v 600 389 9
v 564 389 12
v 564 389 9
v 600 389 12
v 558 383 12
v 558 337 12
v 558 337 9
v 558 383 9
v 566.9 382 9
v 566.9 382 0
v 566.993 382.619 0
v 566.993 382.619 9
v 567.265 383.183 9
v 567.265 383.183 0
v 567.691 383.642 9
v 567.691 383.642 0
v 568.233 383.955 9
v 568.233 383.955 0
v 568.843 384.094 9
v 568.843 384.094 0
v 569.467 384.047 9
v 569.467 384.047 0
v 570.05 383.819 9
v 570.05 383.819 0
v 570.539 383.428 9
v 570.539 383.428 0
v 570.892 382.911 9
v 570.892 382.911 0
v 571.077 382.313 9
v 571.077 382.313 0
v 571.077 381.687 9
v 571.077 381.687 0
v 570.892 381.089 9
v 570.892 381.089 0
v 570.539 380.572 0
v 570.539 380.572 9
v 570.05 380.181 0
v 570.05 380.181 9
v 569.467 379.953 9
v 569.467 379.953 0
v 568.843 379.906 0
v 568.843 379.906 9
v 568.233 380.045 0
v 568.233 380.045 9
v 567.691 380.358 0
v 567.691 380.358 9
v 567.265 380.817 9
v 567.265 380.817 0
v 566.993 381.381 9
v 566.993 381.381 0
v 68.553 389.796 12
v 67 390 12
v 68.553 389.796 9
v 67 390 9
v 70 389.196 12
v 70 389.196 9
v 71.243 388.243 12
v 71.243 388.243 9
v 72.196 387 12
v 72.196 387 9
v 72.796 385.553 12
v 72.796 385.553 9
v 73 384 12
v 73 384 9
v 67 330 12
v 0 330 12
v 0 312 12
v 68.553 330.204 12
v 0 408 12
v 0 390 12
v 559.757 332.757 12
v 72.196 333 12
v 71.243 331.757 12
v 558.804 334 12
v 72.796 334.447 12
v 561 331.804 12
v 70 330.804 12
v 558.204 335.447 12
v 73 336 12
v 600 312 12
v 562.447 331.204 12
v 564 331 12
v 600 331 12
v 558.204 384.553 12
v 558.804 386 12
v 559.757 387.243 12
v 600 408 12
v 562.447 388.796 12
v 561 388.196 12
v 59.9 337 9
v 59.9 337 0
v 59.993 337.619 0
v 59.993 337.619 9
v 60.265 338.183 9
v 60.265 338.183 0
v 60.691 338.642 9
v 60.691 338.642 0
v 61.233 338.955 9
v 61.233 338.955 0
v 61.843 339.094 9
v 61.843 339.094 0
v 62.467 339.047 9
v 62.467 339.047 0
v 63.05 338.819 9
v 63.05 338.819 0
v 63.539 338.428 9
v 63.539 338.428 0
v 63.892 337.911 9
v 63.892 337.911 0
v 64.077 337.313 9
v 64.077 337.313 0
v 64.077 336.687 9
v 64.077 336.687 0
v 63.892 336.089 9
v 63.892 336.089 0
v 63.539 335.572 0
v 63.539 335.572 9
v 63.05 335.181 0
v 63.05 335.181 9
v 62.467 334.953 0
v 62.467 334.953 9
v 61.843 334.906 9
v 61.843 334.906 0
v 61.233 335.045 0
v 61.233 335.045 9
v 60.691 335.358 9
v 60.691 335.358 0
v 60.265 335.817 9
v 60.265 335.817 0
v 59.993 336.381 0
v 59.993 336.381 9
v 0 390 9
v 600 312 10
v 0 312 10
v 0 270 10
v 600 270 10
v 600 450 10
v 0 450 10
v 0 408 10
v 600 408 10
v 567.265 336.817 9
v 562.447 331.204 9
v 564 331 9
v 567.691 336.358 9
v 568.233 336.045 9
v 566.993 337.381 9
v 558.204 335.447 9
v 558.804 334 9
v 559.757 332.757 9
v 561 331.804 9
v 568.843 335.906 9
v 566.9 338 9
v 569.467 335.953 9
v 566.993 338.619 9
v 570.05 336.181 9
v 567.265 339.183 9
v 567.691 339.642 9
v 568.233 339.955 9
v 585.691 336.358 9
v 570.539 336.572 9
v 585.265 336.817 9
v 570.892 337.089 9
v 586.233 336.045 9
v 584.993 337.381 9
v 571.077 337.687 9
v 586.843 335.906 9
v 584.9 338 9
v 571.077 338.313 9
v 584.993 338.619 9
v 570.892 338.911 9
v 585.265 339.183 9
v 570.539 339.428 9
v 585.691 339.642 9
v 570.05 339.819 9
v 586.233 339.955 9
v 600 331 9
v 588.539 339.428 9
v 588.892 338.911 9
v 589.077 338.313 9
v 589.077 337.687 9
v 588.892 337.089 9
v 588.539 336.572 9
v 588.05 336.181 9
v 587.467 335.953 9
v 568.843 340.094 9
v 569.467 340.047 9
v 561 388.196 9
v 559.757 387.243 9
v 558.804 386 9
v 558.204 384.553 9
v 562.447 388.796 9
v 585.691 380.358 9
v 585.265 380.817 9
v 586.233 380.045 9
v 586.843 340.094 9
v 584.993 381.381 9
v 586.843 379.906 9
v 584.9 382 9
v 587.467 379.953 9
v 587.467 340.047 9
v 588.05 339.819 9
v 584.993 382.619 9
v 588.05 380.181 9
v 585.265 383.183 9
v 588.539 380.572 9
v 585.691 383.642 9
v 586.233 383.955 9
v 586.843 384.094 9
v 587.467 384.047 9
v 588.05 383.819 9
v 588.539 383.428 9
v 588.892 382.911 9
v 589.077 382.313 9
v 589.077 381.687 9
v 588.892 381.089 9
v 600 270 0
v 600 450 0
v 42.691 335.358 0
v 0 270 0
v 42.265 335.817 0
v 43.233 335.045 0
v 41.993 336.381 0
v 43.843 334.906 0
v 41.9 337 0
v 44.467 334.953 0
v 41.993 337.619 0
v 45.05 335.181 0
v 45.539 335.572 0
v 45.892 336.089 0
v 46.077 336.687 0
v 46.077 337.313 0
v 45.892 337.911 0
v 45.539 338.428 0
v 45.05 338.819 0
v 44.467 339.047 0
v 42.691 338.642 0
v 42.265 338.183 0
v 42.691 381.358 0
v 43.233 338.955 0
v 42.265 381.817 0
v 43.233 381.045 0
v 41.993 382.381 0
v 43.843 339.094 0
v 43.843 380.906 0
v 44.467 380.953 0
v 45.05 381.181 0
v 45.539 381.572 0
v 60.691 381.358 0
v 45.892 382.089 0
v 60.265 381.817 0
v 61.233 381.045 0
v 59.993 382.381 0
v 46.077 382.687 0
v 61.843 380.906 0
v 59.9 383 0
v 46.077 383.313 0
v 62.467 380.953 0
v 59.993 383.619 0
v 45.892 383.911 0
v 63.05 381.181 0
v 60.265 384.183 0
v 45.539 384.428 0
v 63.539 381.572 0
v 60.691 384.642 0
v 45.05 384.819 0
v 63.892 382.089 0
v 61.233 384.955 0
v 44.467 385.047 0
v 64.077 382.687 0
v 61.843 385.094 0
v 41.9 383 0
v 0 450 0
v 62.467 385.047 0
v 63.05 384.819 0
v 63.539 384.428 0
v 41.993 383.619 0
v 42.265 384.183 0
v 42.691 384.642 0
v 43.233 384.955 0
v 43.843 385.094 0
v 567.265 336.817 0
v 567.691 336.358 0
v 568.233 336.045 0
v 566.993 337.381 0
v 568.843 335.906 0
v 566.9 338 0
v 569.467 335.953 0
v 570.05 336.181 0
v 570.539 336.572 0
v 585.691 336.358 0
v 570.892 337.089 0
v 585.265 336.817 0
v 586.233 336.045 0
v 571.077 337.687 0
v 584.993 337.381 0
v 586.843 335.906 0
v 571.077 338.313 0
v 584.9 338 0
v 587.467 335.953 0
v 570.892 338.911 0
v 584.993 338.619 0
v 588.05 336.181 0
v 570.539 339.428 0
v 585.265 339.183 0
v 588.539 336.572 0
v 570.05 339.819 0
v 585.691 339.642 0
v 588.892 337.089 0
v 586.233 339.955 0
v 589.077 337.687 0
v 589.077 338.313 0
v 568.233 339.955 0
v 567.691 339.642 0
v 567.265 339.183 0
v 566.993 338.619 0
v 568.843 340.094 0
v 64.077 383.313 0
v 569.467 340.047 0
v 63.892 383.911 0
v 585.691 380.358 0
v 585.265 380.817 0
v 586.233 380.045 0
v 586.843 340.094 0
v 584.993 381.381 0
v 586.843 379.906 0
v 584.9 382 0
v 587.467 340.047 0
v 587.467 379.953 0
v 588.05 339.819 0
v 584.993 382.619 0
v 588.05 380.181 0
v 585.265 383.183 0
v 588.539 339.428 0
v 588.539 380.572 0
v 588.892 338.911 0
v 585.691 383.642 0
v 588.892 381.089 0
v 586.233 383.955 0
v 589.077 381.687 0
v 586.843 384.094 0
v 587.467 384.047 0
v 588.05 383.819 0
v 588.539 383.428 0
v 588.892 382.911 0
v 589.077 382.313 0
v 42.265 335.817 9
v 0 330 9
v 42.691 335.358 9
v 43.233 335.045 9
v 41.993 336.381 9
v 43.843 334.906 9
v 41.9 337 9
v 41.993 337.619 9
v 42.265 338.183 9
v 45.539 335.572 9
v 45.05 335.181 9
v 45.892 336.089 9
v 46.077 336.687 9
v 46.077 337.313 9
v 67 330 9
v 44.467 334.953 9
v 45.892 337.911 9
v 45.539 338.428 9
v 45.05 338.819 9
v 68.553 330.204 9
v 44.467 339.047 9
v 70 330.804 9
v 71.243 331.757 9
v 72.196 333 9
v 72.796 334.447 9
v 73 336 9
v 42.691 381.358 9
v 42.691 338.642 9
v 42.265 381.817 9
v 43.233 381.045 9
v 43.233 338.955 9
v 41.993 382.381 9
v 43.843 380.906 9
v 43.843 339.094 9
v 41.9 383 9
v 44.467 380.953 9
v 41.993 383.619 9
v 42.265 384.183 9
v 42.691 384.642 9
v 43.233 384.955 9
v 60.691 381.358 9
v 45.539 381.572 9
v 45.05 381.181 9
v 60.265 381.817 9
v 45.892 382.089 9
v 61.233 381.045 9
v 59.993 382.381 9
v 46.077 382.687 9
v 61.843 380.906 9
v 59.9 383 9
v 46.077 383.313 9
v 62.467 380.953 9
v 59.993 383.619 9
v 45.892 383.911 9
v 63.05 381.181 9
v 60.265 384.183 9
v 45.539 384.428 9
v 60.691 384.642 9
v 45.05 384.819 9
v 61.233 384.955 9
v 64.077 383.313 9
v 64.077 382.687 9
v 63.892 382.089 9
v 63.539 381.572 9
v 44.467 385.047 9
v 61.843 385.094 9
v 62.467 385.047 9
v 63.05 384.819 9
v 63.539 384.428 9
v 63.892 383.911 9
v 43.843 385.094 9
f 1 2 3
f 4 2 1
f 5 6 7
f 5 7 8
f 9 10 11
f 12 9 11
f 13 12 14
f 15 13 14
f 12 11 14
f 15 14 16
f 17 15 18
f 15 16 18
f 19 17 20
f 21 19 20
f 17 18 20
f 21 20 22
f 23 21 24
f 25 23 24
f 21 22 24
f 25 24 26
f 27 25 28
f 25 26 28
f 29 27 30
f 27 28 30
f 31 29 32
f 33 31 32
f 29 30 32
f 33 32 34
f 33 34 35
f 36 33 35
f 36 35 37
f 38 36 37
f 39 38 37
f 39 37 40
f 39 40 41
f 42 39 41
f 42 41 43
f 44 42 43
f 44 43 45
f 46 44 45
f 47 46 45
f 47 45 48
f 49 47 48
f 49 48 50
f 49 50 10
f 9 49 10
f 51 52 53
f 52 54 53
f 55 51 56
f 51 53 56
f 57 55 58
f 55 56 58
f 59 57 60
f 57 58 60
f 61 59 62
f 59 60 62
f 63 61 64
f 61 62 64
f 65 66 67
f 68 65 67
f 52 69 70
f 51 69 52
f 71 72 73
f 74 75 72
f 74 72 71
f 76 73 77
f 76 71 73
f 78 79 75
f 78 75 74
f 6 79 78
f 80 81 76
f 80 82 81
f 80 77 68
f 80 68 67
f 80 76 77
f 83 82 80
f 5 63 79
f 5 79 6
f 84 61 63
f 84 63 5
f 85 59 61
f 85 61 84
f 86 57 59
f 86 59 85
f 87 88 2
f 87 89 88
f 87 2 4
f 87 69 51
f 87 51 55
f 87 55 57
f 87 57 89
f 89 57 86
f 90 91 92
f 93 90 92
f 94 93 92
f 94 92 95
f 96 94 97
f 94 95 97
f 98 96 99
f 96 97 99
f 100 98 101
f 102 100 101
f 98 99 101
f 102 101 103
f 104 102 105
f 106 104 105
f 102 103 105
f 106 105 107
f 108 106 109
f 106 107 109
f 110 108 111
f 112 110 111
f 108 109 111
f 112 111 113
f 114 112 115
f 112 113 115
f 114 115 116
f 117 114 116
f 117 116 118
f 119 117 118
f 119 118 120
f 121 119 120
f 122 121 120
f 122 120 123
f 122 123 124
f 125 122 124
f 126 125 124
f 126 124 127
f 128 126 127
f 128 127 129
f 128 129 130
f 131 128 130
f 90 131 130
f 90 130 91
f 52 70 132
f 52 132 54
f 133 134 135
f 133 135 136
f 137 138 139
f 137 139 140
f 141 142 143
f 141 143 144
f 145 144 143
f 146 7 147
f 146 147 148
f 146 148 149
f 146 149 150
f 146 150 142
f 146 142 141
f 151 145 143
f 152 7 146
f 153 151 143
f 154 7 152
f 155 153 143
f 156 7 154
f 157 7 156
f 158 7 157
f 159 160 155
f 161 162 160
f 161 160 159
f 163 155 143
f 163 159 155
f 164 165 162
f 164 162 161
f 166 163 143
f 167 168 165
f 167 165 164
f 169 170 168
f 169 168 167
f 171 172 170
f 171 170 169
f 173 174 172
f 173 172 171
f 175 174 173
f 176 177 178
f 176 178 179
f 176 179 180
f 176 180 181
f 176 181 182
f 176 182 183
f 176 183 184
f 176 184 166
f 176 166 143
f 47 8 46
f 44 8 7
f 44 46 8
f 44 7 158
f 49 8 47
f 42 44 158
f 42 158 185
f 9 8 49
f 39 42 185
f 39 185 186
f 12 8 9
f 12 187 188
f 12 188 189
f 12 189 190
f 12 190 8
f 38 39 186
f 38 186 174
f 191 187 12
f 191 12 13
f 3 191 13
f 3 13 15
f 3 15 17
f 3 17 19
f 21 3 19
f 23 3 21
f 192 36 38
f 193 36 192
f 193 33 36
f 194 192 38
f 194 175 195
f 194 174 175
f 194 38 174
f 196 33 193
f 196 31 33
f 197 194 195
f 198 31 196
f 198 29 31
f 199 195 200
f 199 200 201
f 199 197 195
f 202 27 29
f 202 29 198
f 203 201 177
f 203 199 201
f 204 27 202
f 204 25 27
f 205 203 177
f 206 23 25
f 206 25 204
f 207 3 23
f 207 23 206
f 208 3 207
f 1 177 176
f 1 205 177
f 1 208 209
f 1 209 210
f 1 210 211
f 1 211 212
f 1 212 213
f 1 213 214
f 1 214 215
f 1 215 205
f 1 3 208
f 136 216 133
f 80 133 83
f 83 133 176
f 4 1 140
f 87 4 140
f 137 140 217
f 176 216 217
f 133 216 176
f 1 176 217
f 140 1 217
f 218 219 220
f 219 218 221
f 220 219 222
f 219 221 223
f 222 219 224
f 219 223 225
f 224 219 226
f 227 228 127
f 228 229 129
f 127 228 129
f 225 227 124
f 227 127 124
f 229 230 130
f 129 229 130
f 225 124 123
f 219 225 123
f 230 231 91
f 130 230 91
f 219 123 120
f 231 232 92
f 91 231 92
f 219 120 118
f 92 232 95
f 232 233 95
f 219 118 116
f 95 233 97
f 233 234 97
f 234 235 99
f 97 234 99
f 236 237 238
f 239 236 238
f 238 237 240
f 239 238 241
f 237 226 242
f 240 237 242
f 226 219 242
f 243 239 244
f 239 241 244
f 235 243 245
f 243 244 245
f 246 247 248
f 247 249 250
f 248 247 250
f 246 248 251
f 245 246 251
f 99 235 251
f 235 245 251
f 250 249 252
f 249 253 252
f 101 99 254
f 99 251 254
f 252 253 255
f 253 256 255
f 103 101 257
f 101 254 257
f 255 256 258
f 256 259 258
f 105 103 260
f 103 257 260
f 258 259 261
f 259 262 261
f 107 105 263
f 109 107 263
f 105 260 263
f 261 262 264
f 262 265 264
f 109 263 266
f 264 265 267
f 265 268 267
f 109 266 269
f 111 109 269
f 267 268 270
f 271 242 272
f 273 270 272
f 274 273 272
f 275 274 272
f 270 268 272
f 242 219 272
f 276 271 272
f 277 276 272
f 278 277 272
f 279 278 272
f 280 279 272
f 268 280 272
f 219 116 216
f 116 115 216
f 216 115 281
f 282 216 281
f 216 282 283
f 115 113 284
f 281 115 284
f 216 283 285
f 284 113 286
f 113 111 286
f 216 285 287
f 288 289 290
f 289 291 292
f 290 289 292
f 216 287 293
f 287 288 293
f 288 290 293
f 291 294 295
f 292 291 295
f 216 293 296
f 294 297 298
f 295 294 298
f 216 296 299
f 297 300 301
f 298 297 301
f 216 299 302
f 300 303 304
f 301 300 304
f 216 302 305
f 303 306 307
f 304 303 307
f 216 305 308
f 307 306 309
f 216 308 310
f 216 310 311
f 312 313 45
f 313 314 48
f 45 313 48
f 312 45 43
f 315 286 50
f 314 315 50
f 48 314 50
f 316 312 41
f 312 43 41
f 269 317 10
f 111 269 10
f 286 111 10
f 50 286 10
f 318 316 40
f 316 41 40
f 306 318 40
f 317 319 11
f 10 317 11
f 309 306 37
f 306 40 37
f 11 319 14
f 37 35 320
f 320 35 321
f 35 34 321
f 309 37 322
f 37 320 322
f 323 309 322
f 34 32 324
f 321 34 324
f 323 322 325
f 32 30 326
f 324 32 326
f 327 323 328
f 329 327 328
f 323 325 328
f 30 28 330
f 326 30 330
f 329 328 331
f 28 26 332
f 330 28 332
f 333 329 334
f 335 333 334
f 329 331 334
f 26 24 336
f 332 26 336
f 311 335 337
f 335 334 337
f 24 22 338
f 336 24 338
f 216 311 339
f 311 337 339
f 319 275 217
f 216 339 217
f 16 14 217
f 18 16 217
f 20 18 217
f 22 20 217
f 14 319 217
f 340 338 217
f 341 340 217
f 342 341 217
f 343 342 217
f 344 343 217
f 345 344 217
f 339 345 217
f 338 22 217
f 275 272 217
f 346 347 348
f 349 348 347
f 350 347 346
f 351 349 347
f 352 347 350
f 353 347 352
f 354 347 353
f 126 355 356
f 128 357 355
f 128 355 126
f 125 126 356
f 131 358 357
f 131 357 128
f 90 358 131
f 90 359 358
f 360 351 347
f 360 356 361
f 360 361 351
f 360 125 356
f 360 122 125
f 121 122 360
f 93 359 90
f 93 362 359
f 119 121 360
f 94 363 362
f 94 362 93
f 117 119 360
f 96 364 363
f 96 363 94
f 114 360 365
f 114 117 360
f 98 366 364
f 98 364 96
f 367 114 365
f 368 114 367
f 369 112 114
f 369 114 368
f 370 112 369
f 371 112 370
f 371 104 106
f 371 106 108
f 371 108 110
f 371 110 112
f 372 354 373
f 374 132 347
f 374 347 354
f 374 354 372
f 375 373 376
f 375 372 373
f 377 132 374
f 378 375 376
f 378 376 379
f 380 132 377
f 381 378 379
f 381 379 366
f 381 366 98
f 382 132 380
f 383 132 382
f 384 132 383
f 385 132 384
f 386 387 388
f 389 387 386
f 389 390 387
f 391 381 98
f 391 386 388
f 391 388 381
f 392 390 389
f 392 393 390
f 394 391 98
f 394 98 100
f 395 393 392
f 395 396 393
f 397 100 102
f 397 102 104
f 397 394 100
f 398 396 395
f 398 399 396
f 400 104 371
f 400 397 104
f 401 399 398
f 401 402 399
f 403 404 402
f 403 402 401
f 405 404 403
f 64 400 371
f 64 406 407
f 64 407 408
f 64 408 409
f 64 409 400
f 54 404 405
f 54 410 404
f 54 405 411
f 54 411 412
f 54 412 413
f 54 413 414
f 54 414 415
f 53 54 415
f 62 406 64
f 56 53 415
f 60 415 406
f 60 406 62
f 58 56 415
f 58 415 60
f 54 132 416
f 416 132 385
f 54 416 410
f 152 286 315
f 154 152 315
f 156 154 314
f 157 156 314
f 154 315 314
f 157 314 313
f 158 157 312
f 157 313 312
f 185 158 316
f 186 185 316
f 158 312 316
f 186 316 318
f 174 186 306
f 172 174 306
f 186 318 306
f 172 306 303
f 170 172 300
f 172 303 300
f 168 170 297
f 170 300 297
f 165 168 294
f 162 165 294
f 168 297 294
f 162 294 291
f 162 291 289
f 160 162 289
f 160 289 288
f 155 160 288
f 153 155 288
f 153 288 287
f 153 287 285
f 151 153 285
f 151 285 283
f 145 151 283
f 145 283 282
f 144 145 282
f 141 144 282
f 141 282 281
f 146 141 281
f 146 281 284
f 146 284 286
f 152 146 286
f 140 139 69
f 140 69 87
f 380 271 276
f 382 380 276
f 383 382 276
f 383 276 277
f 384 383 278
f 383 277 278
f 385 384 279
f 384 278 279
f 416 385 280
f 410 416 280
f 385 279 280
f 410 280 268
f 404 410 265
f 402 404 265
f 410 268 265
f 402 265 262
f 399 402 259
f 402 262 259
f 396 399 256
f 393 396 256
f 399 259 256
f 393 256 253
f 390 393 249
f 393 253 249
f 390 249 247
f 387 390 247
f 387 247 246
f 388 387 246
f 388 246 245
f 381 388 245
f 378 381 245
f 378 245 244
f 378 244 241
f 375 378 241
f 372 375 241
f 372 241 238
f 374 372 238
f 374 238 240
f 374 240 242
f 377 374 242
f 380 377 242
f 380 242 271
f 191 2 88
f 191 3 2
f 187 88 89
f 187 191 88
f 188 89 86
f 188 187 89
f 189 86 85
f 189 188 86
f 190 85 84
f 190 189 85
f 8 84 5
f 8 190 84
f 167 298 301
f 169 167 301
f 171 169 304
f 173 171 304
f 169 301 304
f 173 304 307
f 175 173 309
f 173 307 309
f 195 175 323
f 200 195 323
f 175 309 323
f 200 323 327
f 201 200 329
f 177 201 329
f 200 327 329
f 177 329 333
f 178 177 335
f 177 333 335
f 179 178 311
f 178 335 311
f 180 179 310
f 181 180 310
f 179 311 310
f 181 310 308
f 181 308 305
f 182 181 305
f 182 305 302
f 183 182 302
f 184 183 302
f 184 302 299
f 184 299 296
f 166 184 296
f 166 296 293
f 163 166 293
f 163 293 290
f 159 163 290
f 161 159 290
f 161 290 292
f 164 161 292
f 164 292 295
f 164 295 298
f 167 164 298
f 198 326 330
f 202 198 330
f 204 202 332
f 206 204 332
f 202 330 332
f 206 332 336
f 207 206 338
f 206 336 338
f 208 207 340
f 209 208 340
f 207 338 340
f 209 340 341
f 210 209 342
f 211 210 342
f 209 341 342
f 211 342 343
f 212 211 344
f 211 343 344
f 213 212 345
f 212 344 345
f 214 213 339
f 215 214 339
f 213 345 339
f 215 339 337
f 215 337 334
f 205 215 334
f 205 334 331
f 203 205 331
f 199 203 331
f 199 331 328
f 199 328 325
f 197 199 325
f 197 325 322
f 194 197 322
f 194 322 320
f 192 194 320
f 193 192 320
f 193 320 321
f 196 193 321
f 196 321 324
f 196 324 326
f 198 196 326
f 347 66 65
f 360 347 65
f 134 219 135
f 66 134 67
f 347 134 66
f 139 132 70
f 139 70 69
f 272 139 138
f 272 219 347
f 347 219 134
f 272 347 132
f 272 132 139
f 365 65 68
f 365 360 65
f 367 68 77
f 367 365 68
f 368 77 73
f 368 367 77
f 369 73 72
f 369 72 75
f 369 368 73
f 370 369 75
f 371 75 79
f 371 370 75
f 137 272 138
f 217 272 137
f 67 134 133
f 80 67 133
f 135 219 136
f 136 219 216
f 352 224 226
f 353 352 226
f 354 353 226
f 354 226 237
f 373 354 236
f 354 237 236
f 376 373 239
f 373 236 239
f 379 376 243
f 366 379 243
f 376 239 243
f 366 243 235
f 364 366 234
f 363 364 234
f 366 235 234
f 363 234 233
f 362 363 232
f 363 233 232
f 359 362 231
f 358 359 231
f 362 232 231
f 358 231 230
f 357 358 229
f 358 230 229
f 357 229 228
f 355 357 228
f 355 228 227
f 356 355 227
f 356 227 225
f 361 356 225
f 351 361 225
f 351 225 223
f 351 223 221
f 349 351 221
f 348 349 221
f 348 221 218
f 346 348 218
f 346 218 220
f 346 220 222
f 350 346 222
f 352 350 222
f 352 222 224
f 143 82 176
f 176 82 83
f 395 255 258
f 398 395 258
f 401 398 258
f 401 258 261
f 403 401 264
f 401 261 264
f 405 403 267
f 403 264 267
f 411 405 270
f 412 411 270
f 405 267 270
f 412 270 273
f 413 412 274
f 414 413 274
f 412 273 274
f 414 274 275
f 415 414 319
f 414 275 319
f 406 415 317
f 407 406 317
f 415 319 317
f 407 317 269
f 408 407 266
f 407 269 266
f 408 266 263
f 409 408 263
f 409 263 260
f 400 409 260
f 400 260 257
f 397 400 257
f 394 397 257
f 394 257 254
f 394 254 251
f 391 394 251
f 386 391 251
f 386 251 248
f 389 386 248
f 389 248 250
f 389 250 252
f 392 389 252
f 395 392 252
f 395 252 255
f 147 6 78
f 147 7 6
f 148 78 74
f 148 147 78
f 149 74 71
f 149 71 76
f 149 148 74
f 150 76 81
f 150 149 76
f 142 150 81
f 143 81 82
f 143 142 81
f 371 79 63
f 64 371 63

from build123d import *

# Parameters (mm, degrees)
SZKIC1_W                       = 600
SZKIC1_H                       = 180
DODANIE_WYCI_GNI_CIE1_DEPTH    = 10
SZKIC2_W                       = 600
SZKIC2_H                       = 96
DODANIE_WYCI_GNI_CIE2_DEPTH    = 2
SZKIC3_W                       = 42
SZKIC3_H                       = 58
SZKIC3_W_2                     = 73
SZKIC3_H_2                     = 60
WYTNIJ_WYCI_GNI_CIE1_DEPTH     = 3
ZAOKR_GLENIE1_R                = 6
OTW_R_GWINTOWANY_M5X0_82_D     = 4.2
OTW_R_GWINTOWANY_M5X0_83_D     = 4.2
OTW_R_GWINTOWANY_M5X0_83_DEPTH = 17
OTW_R_GWINTOWANY_M5X0_83_TIP   = 1.2618073


with BuildPart() as part:
    # Szkic1 → Dodanie-wyciągnięcie1 (new body)
    with BuildSketch(Plane.XY):
        with Locations((300, 360)):
            Rectangle(SZKIC1_W, SZKIC1_H)
    extrude(amount=DODANIE_WYCI_GNI_CIE1_DEPTH)

    # Szkic2 → Dodanie-wyciągnięcie2 (add)
    with BuildSketch(Plane.XY.offset(10)):
        with Locations((300, 360)):
            Rectangle(SZKIC2_W, SZKIC2_H)
    extrude(amount=DODANIE_WYCI_GNI_CIE2_DEPTH)

    # Szkic3 → Wytnij-wyciągnięcie1 (cut)
    with BuildSketch(Plane.XY.offset(12)):
        with Locations((579, 360)):
            Rectangle(SZKIC3_W, SZKIC3_H)
        with Locations((36.5, 360)):
            Rectangle(SZKIC3_W_2, SZKIC3_H_2)
    extrude(amount=-WYTNIJ_WYCI_GNI_CIE1_DEPTH, mode=Mode.SUBTRACT)

    # Zaokrąglenie1
    zaokr_glenie1_edges = [part.edges().sort_by_distance(p)[0] for p in [
        (73, 390, 10.5),
        (73, 330, 10.5),
        (558, 331, 10.5),
        (558, 389, 10.5),
    ]]
    fillet(zaokr_glenie1_edges, radius=ZAOKR_GLENIE1_R)

    # Otwór gwintowany M5x0.82 (through all)
    with Locations(Plane.XY.offset(9)):
        with Locations((62, 383), (44, 383), (62, 337), (44, 337)):
            Hole(OTW_R_GWINTOWANY_M5X0_82_D / 2)

    # Otwór gwintowany M5x0.83
    with Locations(Plane.XY.offset(9)):
        with Locations((587, 382), (569, 382), (569, 338), (587, 338)):
            Hole(OTW_R_GWINTOWANY_M5X0_83_D / 2, depth=OTW_R_GWINTOWANY_M5X0_83_DEPTH)
            with Locations((0, 0, -(OTW_R_GWINTOWANY_M5X0_83_DEPTH + OTW_R_GWINTOWANY_M5X0_83_TIP / 2))):  # 118° drill point
                Cone(0, OTW_R_GWINTOWANY_M5X0_83_D / 2, OTW_R_GWINTOWANY_M5X0_83_TIP, mode=Mode.SUBTRACT)


solid = part.part
